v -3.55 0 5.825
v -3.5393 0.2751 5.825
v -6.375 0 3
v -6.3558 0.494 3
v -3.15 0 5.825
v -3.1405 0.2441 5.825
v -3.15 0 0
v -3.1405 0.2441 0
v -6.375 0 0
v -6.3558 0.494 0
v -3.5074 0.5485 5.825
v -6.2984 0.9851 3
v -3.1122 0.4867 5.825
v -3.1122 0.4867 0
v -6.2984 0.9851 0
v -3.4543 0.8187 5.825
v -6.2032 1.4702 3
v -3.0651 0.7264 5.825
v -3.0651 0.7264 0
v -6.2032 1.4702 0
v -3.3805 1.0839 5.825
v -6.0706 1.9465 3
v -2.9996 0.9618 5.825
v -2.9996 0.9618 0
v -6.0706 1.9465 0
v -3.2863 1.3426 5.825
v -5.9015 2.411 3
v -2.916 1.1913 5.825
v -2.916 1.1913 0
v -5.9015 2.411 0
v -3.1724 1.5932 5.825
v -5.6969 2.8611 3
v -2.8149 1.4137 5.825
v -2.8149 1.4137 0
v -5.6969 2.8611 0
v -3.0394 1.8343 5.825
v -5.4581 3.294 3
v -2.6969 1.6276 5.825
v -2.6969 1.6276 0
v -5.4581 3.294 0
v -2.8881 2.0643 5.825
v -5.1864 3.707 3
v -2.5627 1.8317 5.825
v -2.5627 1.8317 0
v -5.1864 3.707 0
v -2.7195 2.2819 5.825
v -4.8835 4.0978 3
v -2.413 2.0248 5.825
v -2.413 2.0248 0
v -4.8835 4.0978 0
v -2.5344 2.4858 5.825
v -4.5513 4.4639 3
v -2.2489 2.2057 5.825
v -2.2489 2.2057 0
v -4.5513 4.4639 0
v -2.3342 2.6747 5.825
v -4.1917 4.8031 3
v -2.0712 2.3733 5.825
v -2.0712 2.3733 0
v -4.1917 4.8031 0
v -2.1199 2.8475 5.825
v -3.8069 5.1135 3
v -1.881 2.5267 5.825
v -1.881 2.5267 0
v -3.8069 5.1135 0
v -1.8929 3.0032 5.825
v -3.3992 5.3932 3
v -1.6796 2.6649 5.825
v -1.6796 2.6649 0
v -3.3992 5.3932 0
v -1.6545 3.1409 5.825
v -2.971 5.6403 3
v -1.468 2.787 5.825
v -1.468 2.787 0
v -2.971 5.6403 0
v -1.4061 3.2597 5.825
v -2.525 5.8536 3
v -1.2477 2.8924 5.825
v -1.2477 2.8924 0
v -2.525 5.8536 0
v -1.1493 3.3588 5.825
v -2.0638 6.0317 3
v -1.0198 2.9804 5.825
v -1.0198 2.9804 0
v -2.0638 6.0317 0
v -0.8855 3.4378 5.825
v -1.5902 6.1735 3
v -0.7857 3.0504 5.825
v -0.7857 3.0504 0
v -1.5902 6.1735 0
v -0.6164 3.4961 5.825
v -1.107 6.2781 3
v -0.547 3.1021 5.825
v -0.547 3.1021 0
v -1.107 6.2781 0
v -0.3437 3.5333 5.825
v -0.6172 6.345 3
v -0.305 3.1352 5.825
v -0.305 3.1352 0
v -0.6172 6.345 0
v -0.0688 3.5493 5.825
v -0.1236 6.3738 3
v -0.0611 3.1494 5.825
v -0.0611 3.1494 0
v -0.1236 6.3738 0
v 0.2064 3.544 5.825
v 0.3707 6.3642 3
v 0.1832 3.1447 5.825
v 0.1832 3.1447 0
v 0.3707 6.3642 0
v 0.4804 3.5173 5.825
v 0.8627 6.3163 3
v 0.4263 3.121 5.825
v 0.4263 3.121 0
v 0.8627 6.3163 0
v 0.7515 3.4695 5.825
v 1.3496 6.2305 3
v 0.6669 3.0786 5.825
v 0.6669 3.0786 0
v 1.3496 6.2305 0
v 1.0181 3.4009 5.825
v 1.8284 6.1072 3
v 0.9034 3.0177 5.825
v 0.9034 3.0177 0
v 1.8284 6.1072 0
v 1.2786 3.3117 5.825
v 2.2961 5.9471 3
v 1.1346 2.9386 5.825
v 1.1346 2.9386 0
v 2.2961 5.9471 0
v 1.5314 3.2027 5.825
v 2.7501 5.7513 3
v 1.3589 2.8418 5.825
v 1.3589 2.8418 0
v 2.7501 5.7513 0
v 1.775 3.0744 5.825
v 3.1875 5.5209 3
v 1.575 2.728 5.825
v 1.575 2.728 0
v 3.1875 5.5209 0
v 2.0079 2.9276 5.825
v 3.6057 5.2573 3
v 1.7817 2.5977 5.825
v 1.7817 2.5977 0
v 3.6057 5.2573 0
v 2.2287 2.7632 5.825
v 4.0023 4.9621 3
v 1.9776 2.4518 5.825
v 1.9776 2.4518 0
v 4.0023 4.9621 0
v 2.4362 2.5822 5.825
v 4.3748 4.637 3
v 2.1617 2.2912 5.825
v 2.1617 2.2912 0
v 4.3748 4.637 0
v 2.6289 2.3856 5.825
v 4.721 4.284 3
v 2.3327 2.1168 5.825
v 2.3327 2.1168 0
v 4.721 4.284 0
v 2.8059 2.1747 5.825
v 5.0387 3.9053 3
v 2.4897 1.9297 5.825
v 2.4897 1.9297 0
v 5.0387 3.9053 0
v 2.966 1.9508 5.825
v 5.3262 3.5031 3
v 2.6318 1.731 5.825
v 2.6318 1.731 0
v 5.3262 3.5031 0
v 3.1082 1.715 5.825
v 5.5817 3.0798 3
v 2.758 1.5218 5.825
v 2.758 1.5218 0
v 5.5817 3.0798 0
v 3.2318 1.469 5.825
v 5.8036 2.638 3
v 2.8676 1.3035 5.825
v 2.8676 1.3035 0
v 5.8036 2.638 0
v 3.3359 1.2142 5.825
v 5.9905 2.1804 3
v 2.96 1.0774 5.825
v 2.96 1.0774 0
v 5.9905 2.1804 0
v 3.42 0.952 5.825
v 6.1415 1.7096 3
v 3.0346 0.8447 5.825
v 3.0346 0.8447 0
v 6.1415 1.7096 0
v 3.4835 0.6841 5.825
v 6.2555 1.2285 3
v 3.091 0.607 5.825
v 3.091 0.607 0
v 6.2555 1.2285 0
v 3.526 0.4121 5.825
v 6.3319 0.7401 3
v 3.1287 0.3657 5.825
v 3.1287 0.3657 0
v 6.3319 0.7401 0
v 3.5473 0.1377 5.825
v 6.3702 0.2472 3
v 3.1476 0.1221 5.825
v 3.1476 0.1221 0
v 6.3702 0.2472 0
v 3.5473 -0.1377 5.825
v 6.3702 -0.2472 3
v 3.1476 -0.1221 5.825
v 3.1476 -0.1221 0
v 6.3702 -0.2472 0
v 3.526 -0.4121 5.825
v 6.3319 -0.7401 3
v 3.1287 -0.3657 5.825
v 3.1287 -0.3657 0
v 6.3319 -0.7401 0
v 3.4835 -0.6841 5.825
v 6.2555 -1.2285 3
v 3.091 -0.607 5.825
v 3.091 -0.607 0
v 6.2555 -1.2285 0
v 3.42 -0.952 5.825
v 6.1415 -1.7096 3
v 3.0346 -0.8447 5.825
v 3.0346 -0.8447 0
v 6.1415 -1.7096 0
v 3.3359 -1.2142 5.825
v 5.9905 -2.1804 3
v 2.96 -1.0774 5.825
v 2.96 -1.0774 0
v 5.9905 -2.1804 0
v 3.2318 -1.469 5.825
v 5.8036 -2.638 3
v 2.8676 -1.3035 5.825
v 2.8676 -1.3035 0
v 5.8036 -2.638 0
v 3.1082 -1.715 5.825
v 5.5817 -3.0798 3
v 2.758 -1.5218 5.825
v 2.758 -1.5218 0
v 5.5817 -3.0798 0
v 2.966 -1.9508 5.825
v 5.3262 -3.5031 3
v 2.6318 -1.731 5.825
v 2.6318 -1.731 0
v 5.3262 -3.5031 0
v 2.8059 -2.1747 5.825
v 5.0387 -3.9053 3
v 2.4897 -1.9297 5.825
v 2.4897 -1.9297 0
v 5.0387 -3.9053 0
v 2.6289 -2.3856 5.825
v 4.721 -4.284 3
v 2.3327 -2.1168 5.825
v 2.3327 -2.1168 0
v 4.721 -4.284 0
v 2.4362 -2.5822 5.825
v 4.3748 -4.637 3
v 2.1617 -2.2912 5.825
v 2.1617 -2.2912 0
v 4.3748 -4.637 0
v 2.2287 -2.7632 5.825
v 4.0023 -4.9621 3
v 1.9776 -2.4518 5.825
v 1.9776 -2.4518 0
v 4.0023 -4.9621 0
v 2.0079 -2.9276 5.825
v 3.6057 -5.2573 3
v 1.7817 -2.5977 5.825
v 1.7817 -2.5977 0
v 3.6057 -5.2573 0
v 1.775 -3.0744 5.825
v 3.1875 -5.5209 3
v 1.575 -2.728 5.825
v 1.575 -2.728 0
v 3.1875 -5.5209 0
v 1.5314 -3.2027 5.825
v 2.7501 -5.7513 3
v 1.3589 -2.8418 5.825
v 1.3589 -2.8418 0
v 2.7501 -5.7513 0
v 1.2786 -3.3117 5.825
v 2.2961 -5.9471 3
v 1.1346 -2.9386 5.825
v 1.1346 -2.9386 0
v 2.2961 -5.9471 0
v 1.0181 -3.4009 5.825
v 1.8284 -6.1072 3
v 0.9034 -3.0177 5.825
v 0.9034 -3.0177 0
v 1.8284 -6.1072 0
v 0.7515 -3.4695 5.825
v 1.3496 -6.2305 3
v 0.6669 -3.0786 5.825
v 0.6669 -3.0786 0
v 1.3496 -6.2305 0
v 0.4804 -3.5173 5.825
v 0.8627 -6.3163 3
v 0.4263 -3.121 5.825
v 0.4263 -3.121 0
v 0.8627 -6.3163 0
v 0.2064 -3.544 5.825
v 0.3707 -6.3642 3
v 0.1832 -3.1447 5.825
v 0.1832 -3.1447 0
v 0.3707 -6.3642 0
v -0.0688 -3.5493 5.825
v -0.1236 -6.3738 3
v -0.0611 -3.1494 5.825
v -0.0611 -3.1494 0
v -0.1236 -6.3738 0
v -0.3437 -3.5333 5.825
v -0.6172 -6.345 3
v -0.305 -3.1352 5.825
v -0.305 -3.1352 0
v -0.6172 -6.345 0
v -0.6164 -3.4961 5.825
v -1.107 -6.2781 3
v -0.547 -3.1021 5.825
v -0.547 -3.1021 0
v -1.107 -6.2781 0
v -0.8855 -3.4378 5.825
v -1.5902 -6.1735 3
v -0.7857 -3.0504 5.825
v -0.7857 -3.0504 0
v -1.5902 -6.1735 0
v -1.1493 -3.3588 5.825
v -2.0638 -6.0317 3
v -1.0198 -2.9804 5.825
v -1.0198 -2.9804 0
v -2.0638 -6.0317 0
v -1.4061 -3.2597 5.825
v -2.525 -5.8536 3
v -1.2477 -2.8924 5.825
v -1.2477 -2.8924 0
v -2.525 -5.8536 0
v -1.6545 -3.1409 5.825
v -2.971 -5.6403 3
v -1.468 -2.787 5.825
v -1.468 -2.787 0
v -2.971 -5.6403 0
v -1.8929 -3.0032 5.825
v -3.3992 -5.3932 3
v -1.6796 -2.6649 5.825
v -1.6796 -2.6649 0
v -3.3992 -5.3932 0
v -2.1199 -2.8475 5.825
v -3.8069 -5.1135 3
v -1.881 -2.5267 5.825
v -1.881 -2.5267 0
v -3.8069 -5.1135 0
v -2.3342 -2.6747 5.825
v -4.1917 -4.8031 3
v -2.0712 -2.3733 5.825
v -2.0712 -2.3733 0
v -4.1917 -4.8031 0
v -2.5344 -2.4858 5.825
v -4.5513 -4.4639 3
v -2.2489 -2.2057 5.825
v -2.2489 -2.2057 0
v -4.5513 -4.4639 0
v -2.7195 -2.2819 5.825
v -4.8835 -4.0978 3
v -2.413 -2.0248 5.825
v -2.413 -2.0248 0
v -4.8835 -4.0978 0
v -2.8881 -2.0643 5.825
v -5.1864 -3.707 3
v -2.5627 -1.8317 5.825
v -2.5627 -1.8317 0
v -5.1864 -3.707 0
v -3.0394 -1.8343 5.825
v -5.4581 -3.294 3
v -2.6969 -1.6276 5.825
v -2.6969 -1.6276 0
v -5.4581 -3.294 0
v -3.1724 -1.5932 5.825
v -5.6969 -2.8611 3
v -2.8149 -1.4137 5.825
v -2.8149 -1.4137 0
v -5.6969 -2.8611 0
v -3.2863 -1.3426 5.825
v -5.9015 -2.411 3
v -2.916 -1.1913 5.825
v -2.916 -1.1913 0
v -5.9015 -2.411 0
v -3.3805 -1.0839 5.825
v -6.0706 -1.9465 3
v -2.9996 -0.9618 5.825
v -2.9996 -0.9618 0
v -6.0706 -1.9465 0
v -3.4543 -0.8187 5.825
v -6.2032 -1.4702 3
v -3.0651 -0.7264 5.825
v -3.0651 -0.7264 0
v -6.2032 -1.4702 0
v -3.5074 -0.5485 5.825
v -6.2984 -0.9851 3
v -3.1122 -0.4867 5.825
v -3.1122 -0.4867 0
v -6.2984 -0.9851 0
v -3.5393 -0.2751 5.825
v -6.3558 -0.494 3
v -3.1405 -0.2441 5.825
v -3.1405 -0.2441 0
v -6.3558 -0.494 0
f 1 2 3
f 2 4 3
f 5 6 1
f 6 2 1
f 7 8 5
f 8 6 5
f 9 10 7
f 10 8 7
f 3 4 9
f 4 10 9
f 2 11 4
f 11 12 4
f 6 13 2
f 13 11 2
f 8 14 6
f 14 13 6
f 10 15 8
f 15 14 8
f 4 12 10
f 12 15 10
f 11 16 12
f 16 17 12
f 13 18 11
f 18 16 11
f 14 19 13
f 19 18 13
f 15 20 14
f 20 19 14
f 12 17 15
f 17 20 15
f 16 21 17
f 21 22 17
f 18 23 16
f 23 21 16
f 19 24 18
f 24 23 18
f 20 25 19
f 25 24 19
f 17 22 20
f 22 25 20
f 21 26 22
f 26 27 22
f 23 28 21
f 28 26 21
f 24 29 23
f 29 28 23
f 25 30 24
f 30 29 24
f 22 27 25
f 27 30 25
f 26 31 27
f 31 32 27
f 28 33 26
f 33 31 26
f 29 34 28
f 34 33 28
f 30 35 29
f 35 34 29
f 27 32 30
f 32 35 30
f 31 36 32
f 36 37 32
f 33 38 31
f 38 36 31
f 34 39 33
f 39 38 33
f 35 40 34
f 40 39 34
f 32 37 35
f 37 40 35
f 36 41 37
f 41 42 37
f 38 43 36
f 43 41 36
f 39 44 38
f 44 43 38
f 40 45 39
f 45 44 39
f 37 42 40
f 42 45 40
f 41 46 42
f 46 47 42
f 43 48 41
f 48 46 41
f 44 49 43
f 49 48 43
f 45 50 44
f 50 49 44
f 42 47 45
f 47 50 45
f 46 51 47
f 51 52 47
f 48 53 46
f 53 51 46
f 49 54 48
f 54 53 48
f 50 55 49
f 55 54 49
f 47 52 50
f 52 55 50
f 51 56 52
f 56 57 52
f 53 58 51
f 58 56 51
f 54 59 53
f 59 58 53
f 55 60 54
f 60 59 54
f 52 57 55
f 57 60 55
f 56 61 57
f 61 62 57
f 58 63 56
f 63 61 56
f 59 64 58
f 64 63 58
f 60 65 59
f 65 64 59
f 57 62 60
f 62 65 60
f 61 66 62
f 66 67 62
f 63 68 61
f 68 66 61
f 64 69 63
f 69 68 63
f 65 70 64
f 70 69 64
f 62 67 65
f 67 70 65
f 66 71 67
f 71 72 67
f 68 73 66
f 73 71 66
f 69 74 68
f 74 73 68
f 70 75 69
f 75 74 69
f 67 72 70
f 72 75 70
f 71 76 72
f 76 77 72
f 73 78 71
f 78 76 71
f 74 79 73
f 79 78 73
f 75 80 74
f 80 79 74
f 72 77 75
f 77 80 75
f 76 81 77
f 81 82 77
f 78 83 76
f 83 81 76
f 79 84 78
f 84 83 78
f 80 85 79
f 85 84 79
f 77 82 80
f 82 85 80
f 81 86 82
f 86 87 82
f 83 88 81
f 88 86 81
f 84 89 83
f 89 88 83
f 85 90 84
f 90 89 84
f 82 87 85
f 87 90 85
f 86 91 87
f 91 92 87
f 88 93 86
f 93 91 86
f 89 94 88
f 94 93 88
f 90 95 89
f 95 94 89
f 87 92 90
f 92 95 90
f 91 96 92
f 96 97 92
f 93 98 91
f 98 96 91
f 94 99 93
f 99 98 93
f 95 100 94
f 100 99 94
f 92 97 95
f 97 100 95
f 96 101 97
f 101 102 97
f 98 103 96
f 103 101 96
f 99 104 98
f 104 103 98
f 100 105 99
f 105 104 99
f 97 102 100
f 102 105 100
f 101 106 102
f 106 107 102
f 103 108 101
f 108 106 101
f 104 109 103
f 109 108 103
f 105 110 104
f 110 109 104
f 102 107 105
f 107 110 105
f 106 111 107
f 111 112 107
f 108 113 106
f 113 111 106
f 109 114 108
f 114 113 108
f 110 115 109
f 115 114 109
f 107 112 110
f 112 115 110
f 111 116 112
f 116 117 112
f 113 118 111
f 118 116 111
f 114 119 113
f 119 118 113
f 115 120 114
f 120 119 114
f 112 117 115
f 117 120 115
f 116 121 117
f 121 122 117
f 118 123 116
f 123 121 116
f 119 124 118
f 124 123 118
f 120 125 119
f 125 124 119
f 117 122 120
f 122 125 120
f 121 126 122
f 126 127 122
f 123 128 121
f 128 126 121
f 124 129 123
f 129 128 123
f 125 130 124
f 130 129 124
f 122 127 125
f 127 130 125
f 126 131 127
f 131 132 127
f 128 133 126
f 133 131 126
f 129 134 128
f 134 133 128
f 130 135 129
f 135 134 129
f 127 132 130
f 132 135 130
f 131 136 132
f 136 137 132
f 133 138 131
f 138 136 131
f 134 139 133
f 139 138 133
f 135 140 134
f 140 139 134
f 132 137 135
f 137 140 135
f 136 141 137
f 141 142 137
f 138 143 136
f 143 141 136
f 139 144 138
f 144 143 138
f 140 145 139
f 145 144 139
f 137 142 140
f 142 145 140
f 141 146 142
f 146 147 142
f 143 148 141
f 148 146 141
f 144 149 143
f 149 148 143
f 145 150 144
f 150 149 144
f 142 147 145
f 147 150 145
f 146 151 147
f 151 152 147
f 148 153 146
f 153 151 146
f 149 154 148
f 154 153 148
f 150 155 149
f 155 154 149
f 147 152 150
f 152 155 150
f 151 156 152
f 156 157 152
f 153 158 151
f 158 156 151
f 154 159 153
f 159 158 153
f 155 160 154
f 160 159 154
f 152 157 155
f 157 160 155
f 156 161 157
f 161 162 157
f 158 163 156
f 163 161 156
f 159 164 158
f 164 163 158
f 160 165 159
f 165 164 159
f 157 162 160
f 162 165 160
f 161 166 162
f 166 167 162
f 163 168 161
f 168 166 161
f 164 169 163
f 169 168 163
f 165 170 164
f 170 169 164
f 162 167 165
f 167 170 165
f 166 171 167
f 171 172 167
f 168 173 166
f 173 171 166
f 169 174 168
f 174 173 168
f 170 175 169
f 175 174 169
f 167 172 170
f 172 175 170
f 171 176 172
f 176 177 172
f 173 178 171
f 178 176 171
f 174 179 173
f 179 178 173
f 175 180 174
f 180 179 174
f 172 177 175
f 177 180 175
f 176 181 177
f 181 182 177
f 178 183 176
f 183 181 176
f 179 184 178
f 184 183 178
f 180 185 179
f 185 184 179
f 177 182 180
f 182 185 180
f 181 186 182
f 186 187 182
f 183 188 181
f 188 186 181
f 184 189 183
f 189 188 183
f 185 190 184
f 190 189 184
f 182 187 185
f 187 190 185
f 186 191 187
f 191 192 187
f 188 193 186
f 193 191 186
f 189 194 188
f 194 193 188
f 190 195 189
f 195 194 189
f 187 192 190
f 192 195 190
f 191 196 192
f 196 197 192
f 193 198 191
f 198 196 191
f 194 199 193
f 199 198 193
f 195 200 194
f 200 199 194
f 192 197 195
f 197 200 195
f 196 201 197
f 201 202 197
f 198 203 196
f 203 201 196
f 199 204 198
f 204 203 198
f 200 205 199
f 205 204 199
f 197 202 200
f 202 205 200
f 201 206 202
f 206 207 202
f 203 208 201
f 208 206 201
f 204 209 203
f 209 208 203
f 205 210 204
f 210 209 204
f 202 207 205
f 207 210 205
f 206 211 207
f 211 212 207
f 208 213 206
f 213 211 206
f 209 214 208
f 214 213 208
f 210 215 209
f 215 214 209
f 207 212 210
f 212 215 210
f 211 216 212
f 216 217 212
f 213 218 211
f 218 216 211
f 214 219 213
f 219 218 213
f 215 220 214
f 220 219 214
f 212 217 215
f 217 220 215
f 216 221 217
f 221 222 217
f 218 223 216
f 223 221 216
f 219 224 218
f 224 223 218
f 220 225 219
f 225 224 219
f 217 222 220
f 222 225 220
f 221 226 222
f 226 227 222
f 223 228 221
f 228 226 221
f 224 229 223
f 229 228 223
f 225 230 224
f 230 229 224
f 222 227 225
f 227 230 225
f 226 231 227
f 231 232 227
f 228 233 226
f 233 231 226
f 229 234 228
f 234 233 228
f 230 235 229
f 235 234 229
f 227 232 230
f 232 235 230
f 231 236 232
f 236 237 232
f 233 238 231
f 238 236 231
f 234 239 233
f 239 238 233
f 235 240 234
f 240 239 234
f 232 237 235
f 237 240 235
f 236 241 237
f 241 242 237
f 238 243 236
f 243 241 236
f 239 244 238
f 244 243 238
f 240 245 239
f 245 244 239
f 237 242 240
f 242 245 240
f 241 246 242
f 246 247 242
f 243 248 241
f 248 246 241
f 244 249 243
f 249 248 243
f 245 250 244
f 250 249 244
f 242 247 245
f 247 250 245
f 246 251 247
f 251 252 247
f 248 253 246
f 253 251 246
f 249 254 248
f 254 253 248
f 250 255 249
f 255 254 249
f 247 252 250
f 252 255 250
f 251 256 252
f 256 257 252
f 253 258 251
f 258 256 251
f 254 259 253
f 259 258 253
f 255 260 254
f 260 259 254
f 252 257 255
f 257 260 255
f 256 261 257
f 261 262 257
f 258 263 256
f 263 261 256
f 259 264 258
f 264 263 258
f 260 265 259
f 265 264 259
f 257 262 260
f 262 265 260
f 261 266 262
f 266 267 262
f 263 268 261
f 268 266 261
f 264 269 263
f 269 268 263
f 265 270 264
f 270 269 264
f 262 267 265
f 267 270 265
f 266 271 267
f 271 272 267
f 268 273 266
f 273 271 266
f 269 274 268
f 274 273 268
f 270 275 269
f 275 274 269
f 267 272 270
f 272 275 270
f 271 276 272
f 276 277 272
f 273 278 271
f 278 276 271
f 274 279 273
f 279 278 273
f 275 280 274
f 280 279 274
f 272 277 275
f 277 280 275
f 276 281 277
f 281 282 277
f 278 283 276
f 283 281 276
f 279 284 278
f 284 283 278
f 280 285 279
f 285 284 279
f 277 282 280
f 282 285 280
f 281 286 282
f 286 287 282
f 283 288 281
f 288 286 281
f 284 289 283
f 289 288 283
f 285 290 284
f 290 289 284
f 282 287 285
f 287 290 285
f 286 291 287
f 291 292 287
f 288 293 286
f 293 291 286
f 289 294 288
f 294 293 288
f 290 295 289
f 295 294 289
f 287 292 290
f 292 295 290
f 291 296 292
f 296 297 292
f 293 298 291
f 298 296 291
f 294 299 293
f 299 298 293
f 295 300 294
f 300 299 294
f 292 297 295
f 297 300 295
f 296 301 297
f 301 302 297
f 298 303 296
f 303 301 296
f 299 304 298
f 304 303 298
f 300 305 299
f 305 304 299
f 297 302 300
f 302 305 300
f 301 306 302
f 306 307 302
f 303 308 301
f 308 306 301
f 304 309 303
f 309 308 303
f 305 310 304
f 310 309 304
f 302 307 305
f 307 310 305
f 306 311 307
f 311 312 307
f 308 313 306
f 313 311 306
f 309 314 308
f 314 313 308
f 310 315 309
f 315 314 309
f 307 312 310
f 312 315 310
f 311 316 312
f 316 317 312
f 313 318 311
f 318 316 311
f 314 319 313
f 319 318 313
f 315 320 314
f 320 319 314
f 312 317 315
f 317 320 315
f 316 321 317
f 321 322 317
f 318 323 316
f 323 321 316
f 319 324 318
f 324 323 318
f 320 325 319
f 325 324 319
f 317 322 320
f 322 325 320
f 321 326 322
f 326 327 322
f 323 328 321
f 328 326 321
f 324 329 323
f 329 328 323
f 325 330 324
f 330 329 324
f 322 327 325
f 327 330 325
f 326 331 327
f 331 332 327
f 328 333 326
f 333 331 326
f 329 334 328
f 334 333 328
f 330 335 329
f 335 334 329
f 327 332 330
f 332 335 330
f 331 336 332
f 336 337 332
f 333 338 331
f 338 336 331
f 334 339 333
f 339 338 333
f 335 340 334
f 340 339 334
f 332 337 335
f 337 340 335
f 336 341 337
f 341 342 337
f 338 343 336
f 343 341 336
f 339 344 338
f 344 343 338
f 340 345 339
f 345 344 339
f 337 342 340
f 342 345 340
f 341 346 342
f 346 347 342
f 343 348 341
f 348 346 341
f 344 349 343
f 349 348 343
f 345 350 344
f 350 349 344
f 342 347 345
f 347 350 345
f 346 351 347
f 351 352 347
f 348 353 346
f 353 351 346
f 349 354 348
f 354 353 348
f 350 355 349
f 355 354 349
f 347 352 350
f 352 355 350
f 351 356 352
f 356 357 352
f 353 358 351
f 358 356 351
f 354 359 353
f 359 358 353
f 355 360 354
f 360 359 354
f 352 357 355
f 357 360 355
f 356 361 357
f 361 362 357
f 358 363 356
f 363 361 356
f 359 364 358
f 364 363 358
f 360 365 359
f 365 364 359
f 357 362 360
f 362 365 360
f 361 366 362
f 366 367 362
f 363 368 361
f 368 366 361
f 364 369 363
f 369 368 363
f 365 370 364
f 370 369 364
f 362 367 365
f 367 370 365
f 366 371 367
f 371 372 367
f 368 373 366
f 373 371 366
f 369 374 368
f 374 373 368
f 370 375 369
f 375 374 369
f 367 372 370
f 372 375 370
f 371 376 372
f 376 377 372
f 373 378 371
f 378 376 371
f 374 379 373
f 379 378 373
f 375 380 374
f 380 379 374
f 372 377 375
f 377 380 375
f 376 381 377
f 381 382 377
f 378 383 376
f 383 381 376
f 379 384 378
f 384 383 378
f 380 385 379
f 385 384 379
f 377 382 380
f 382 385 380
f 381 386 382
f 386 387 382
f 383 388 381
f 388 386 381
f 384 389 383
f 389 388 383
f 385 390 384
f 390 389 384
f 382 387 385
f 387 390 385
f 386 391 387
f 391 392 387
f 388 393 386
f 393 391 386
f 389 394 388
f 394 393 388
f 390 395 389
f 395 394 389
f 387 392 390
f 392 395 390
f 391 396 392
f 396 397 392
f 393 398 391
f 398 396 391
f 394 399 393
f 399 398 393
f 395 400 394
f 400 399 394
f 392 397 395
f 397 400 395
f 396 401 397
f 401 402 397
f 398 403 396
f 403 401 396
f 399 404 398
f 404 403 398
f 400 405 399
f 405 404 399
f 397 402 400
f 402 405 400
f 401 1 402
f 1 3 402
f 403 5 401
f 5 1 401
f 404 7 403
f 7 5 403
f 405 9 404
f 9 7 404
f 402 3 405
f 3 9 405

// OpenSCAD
    
$fs = 0.5;
$fa = 3;

max_spool_thickness = 8;

bearing_dia = 12.75;
bearing_inner_dia = 6.30;
bearing_height = 4.75;
wheel_dia = 30;
wheel_t = 1.2;
wheel_height = wheel_t*2 + max_spool_thickness;
wheel_tolerance = 0.1;

base_wheel_distance = 140;
base_thickness = 0.48 * 6;
base_wheel_offset = 10;
base_wheel_spacing = 3;
base_wheel_hole = 6.3;
base_mount_hole = 6.3;
base_wheel_tolerance = 0.2;

function arc_seg(n, r, a) = let(angle = min(360, abs(a[1] - a[0])) / 360) n == undef 
    ? $fn > 0 ? max($fn, 3) : ceil(max(min(360/$fa,r[0]*2*PI*angle/$fs),5))
    : n;

function arc(a, r, d, n, l = true, p = [0,0]) = let(
    angle = len(a) == undef ? [0, a] : a,
    radius = d == undef 
        ? (r[0] == undef ? [r, r] : r) 
        : (d[0] == undef ? [d/2,d/2] : d / [2,2]),
    segments = arc_seg(n, radius, angle)
) [ for (i = [0:l ? segments : segments - 1]) let(ca = angle[0] + i * (angle[1] - angle[0]) / segments) [cos(ca) * radius[0], sin(ca) * radius[1]] + p ];

module wheel() {

    r = bearing_dia/2 + wheel_tolerance;
    w = wheel_dia/2 - r;
    s = (wheel_height - bearing_height)/2;

    rotate_extrude()
    translate([r,0])        
    difference() {

        polygon([[0, s], [s, 0], [w, 0], [w,wheel_height], [s,wheel_height], [0, s + bearing_height]]);

        translate([w, wheel_height/2])
        circle(d = max_spool_thickness);
    }

}

module bearing() {

    difference() {
        cylinder(d = bearing_dia, h = bearing_height);
        translate([0,0,-0.1])
        cylinder(d = bearing_inner_dia, h = bearing_height + 0.1 * 2);
    }
    
}

module base_shape(dia, off, hole) {
    
    d = base_wheel_distance + wheel_dia - dia;
    w = d / 2;
    
    or = wheel_dia/2;
    wr = dia / 2;
    o = off;
    h = hole;
    r = (w*w + 2*wr*o + o*o) / (4*wr + 2*o);
    t = base_thickness;
    a = acos(w / (r + wr));
    
    difference() {
    
        polygon(concat(
            arc([0,180-a], r = wr, p = [d + wr,t + o + wr]), 
            arc([360-a,180+a], r = r, p = [w + wr,t + r]), 
            arc([a,180], r = wr, p =[wr,t + o + wr]),
            [[0,0], [d + dia,0]]
        ));

        translate([wr, o + t + wr])
        circle(d = h);
        
        translate([wr + d, o + t + wr])
        circle(d = h);
    }
       
}

module base_holder() {
    translate([0,base_thickness,0])
    rotate([90,0,0])
        linear_extrude(base_thickness)
            base_shape(wheel_dia, base_wheel_offset, base_wheel_hole);
}

module wheel_spacer() {
    
    w = (bearing_dia - base_wheel_hole)/2;
    s = (wheel_height - bearing_height)/2;

    rotate_extrude()
    translate([base_wheel_hole/2,0])
    polygon([[0,0], [w, 0], [w, base_wheel_spacing], [w - s, base_wheel_spacing + s], [0, base_wheel_spacing + s]]);
    
}

module spool(dia, width) {
    
    id = 52;
    t = 5;
    
    difference() {
        union() {
            cylinder(d = dia, h = t);
            
            translate([0,0,width - t])
            cylinder(d = dia, h = t);
            
            cylinder(d = id + t, h = width);
        }
        translate([0,0,-1])
        cylinder(d = id, h = width + 2);
    }
}

module wheel_with_spacers() {
    
    wheel();
    
    translate([0,0, -base_wheel_spacing - base_wheel_tolerance])
    wheel_spacer();
    
    translate([0,0,wheel_height + base_wheel_spacing + base_wheel_tolerance])
    rotate([180,0,0])
    wheel_spacer();
    
    translate([0,0,(wheel_height - bearing_height)/2])
    #bearing();
    
}

module base_mount() {
    base_shape(base_mount_hole + base_thickness*2, 0, base_mount_hole);
}

module base() {
    
    l = base_wheel_tolerance*4 + base_wheel_spacing*2 + wheel_height + base_thickness*2;
    wr = wheel_dia / 2;
    
    base_holder();
    
    translate([0,l - base_thickness,0])
    base_holder();

    linear_extrude(base_thickness) {

        translate([0, l - base_thickness])
            base_mount();
        
        translate([0, base_thickness])
            mirror([0, 1])
                base_mount();
        
        square([wheel_dia + base_wheel_distance, l]);
    }
    
}

module base_with_wheels() {
    
    wr = wheel_dia/2;
    wtol = base_wheel_tolerance;
    wo = base_wheel_offset;
    ws = base_wheel_spacing;
    wd = base_wheel_distance;
    t = base_thickness;
    
    translate([wr,wtol*2 + ws + t,wo + t + wr]) {
        
        rotate([-90,0,0])
        wheel_with_spacers();

        translate([wd,0,0])
        rotate([-90,0,0])
        wheel_with_spacers();

    }

    base();
    
}

module all(spool_dia, spool_width) {

    wr = wheel_dia/2;
    wd = base_wheel_distance;
    wo = base_wheel_offset;
    ws = base_wheel_spacing;
    wh = wheel_height;
    t = base_thickness;
    wtol = base_wheel_tolerance;
    
    base_with_wheels();

    translate([0, spool_width - 5, 0])
    base_with_wheels();

    translate([wr + wd/2,t+ws+wtol*2+(wh-5)/2,115])
    rotate([-90,0,0])
    spool(spool_dia, spool_width);

}

wheel_spacer();
//wheel();

//all(188, 80);
//all(202, 56);

//base();
//wheel_with_spacers();
